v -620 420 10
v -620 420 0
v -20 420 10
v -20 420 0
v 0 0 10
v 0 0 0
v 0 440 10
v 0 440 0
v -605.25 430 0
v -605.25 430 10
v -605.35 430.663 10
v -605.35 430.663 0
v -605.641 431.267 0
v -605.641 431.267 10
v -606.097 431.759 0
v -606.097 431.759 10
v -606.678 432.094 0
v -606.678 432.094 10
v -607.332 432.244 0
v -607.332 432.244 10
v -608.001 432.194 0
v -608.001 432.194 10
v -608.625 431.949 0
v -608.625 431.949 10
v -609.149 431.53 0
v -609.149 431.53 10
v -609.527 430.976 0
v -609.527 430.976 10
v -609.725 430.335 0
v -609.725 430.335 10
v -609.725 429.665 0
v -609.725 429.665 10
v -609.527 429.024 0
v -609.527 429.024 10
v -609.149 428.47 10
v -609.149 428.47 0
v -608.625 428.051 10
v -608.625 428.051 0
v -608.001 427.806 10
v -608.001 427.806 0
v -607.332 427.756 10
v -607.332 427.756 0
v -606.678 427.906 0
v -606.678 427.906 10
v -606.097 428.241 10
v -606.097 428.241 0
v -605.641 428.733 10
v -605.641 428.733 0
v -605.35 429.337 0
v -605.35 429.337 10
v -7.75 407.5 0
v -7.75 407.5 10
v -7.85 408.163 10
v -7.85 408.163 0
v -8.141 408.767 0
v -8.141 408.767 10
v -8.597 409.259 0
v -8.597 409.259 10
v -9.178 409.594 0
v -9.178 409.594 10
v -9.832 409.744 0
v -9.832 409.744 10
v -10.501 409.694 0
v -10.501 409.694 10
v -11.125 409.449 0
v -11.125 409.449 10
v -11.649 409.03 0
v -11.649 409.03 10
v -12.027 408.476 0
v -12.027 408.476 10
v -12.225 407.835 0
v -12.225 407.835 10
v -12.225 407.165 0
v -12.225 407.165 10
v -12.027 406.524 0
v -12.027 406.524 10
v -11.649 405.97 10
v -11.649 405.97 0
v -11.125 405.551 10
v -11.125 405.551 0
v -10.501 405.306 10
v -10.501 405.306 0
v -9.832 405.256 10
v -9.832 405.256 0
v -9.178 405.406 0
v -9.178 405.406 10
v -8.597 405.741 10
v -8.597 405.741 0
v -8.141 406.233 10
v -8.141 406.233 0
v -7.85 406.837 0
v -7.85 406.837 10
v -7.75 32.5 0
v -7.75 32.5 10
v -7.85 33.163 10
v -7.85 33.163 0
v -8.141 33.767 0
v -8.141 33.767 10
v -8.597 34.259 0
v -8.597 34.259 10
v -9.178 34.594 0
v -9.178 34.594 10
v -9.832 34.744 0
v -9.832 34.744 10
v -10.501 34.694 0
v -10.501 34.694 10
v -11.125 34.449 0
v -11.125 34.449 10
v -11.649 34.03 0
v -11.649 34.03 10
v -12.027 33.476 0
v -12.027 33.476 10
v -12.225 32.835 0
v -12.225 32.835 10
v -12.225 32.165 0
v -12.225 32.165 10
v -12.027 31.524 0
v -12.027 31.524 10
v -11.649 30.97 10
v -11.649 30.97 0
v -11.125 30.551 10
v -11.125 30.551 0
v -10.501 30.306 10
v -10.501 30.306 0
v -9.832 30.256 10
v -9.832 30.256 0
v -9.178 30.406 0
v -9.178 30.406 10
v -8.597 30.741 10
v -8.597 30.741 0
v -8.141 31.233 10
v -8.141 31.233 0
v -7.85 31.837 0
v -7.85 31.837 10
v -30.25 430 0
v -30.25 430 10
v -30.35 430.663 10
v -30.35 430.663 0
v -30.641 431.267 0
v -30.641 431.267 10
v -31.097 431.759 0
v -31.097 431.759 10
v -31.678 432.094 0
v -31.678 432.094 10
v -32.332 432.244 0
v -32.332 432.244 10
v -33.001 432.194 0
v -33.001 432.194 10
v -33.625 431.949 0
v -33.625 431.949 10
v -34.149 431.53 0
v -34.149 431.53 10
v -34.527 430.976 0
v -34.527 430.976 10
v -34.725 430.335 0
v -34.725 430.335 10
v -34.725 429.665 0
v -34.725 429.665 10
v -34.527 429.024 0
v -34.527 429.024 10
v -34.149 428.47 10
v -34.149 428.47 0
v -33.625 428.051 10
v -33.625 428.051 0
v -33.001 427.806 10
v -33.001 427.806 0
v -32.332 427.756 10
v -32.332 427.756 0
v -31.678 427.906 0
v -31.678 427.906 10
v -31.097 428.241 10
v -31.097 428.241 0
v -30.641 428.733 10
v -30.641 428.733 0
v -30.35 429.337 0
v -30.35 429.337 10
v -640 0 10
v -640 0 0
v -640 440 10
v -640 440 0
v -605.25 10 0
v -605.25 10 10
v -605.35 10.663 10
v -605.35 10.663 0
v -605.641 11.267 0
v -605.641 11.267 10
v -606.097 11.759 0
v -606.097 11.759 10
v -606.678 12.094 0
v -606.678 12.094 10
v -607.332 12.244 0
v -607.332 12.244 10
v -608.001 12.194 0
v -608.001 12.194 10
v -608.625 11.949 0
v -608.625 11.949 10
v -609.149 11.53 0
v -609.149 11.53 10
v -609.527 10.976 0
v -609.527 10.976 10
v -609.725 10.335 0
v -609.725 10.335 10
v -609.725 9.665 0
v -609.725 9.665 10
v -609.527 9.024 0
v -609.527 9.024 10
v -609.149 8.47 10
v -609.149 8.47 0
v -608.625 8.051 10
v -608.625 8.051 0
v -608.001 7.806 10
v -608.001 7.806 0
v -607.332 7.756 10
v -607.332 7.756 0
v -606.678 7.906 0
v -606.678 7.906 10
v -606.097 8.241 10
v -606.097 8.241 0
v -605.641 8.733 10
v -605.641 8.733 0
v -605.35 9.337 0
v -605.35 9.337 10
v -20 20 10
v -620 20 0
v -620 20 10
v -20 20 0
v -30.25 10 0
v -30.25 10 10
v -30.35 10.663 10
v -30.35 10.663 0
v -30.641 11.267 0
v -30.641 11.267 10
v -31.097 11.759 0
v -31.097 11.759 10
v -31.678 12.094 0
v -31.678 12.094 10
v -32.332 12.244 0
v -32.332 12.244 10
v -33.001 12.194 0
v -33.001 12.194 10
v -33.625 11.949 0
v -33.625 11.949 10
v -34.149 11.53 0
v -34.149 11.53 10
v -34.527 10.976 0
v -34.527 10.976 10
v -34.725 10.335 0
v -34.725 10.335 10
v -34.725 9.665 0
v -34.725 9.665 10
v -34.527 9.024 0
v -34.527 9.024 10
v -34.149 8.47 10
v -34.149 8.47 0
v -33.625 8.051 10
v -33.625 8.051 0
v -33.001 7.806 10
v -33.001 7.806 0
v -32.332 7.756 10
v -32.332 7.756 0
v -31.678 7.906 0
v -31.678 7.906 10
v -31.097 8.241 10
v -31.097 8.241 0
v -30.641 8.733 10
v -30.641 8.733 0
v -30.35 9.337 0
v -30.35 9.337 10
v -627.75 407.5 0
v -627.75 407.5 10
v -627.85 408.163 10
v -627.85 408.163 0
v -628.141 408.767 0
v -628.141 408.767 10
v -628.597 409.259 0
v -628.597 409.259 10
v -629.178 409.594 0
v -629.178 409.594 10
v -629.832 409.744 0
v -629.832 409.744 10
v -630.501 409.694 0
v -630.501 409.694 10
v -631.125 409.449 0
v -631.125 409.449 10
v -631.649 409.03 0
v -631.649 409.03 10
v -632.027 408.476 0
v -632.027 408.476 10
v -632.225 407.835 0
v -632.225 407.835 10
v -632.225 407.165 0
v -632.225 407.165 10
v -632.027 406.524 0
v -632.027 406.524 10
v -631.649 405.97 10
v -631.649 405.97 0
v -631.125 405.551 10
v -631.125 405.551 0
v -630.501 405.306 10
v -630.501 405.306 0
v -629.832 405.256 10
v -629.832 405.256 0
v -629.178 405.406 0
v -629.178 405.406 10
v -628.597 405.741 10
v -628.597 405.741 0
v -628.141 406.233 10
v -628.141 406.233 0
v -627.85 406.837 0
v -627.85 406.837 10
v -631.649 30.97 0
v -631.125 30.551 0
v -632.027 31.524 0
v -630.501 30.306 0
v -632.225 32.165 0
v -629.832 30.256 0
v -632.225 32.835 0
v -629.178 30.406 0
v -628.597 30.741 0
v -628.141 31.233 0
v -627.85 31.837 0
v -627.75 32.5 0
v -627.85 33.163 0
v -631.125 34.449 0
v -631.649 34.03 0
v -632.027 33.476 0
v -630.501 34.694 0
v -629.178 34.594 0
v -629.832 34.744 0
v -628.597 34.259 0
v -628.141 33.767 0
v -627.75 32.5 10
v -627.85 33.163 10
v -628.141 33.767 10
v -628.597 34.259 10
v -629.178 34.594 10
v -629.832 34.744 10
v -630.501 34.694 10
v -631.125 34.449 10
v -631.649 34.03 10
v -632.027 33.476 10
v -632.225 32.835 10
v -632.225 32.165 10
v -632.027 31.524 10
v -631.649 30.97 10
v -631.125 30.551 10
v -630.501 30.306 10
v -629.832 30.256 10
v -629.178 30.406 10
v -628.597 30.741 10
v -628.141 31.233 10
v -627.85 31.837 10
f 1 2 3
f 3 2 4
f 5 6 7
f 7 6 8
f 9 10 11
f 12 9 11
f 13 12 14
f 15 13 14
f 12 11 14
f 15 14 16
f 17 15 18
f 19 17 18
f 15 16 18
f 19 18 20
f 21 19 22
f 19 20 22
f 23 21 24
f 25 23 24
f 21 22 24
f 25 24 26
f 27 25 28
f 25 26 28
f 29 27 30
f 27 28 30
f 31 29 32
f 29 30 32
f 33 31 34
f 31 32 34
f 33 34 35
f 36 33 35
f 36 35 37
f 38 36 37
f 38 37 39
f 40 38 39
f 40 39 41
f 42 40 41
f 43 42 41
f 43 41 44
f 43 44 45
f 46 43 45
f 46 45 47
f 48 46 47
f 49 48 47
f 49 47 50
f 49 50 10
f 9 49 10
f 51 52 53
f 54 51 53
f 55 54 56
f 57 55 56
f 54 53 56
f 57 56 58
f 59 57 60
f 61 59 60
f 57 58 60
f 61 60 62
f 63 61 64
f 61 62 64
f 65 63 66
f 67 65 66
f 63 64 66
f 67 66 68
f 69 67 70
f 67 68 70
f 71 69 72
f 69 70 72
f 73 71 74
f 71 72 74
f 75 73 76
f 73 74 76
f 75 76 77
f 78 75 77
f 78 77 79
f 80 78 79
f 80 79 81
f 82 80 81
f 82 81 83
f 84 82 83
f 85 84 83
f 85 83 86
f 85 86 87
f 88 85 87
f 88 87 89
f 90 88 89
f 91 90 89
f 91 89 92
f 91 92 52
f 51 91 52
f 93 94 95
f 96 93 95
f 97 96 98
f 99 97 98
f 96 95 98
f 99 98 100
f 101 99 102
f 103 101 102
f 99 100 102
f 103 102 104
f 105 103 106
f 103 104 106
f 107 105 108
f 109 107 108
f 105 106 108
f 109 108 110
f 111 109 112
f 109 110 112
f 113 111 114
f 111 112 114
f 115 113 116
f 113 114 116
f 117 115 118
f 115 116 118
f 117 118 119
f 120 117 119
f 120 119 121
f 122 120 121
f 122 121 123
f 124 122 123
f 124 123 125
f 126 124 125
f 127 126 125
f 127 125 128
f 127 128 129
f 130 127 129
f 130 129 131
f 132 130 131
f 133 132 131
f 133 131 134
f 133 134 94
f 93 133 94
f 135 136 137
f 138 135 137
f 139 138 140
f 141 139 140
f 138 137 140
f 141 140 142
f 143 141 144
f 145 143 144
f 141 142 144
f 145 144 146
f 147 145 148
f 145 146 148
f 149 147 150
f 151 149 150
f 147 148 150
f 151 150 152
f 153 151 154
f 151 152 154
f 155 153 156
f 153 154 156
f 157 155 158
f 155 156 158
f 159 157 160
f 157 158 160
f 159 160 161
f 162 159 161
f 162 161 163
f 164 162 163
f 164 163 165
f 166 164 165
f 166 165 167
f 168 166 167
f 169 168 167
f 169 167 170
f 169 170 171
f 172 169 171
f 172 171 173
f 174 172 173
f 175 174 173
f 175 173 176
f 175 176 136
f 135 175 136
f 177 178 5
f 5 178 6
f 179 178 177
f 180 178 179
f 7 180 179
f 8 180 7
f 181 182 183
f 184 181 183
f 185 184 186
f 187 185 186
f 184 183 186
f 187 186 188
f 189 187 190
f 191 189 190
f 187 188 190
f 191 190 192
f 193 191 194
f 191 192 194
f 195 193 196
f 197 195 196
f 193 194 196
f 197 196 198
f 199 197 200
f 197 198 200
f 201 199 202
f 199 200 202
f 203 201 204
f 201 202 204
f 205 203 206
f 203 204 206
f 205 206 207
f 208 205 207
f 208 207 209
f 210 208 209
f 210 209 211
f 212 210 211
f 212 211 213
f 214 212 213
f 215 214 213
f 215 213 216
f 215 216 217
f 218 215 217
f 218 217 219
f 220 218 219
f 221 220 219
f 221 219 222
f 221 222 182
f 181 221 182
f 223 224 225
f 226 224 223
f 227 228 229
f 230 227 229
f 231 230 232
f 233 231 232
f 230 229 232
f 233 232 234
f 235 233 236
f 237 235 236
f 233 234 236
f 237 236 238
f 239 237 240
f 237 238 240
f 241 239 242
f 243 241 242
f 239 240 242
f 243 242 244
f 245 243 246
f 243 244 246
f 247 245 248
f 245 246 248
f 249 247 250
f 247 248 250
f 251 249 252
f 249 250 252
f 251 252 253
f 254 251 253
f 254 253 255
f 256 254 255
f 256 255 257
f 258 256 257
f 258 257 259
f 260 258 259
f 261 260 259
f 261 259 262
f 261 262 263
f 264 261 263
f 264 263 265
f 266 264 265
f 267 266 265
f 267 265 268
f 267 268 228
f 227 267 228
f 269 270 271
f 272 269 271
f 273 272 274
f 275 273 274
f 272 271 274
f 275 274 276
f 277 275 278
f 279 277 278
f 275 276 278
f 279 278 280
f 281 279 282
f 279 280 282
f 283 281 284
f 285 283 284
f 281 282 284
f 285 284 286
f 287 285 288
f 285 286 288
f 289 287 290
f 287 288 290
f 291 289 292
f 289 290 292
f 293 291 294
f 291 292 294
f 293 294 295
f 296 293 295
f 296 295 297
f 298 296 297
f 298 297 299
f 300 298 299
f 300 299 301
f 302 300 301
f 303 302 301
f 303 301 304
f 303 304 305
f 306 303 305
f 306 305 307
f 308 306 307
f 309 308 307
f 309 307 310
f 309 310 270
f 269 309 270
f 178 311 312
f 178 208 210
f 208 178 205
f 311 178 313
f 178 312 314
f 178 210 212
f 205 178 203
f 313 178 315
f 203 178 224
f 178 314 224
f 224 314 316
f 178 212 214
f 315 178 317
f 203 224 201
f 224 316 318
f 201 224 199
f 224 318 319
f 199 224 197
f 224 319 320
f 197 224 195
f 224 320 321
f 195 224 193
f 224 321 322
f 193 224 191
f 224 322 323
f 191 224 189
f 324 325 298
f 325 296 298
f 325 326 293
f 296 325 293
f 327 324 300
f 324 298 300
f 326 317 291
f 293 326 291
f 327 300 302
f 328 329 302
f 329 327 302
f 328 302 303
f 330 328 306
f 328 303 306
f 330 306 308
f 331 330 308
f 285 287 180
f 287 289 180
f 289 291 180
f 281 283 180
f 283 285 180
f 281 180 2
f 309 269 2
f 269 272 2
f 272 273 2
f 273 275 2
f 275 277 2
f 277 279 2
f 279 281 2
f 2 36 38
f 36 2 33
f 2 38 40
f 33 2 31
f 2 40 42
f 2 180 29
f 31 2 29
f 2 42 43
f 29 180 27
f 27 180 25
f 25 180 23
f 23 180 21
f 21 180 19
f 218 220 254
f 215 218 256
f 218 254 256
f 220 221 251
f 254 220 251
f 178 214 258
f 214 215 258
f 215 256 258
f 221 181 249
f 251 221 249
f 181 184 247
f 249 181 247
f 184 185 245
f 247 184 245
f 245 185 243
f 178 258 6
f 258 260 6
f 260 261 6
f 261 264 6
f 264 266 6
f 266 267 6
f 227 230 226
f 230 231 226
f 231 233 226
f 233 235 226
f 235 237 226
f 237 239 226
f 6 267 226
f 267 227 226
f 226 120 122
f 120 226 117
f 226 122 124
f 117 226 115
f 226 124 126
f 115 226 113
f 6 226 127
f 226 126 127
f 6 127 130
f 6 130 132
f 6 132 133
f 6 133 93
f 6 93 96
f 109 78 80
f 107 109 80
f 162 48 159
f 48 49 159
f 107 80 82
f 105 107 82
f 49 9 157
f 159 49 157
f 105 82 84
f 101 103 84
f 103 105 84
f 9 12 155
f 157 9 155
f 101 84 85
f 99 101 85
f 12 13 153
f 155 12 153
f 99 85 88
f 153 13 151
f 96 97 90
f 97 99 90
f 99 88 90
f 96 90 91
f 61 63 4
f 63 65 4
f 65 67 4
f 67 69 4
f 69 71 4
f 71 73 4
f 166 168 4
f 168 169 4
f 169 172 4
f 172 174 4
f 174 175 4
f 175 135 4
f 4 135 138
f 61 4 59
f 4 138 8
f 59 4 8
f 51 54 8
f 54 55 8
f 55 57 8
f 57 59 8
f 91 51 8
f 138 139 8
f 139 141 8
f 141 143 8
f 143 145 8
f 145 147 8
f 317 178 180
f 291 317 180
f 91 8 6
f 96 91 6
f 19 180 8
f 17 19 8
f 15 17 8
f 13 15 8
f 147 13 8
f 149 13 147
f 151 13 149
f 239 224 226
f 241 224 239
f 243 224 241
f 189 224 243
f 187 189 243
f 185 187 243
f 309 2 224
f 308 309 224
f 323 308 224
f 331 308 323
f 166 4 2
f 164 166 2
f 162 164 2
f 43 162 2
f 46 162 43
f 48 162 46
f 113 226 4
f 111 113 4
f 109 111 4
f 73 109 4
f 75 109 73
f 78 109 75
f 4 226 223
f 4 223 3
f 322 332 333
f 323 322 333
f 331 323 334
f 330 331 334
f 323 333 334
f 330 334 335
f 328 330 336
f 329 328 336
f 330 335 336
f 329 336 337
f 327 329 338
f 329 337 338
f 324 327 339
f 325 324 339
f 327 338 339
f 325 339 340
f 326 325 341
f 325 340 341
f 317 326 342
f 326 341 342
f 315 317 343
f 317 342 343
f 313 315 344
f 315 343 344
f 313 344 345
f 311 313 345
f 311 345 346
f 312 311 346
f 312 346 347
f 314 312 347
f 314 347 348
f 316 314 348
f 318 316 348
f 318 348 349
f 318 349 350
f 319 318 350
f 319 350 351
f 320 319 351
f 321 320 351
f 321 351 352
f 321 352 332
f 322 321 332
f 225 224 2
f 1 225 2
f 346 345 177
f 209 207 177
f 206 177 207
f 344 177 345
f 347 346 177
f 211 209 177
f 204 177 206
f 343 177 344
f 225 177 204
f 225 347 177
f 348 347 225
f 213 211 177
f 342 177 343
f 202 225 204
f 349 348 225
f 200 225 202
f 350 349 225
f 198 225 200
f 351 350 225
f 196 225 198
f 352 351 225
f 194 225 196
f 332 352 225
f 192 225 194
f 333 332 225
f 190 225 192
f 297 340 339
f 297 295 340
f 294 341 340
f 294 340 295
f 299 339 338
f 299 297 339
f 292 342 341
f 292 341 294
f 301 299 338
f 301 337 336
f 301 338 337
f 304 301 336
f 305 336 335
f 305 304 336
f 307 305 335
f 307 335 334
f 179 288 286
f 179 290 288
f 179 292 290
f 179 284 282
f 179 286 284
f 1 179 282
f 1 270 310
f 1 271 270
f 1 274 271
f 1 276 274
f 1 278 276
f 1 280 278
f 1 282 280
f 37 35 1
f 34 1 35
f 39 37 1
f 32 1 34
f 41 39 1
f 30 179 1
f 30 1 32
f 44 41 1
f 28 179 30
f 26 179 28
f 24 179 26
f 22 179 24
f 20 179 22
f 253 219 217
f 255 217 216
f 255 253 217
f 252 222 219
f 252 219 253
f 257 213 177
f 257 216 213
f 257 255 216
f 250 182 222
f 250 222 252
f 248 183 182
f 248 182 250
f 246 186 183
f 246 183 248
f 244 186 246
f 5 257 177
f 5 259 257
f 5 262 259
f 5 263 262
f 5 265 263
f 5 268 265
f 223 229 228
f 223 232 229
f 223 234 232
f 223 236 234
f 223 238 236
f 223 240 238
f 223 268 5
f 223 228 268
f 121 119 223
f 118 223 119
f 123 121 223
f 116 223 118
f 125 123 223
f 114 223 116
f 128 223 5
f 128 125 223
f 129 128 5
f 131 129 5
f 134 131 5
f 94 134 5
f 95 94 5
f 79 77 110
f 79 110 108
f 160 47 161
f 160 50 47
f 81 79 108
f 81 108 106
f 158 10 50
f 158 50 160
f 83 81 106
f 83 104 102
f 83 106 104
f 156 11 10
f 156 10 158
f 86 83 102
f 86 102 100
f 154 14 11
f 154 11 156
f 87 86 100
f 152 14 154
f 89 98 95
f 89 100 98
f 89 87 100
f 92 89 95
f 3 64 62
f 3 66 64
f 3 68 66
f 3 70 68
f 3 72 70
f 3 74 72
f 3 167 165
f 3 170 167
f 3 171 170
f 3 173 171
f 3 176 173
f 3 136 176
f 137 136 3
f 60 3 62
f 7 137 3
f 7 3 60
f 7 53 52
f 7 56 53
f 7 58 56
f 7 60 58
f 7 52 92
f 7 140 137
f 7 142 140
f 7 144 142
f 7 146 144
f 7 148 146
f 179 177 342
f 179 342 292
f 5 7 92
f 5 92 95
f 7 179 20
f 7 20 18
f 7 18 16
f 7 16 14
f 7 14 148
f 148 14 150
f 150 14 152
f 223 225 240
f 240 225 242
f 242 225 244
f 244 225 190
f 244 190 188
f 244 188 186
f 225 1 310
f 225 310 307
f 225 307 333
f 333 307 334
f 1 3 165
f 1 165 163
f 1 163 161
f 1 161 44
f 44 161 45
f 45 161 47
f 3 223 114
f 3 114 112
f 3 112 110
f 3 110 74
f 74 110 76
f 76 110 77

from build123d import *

# Parameters (mm, degrees)
ESQUISSE1_W             = 640
ESQUISSE1_H             = 440
ESQUISSE1_W_2           = 600
ESQUISSE1_H_2           = 400
BOSS_EXTRU_1_DEPTH      = 10
ESQUISSE2_R             = 2.25
ENL_V_MAT_EXTRU_1_DEPTH = 11


with BuildPart() as part:
    # Esquisse1 → Boss.-Extru.1 (new body)
    with BuildSketch(Plane.XY):
        with Locations((-320, 220)):
            Rectangle(ESQUISSE1_W, ESQUISSE1_H)
        with Locations((-320, 220)):
            Rectangle(ESQUISSE1_W_2, ESQUISSE1_H_2, mode=Mode.SUBTRACT)
    extrude(amount=BOSS_EXTRU_1_DEPTH)

    # Esquisse2 → Enlèv. mat.-Extru.1 (cut, through all)
    with BuildSketch(Plane.XY.offset(10)):
        with Locations((-32.5, 430)):
            Circle(ESQUISSE2_R)
        with Locations((-10, 407.5)):
            Circle(ESQUISSE2_R)
        with Locations((-607.5, 430)):
            Circle(ESQUISSE2_R)
        with Locations((-630, 407.5)):
            Circle(ESQUISSE2_R)
        with Locations((-630, 32.5)):
            Circle(ESQUISSE2_R)
        with Locations((-607.5, 10)):
            Circle(ESQUISSE2_R)
        with Locations((-32.5, 10)):
            Circle(ESQUISSE2_R)
        with Locations((-10, 32.5)):
            Circle(ESQUISSE2_R)
    extrude(amount=-ENL_V_MAT_EXTRU_1_DEPTH, mode=Mode.SUBTRACT)


solid = part.part
